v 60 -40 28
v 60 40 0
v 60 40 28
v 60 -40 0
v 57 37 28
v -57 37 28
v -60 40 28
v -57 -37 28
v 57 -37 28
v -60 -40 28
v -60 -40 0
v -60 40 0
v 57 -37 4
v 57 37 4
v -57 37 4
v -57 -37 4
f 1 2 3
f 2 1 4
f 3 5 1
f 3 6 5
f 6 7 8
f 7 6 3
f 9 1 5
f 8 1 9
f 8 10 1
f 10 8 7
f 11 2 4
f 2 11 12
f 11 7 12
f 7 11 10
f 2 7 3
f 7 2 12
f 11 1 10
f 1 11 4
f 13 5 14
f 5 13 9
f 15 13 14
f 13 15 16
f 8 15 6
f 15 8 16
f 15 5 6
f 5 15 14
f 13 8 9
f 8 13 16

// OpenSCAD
// Starter shell for task-001. Units: millimetres.
// Preserve x=[-60,60], y=[-40,40], z=[0,28], wall=3, floor=4.
$fn = 64;

outer_w = 120;
outer_d = 80;
outer_h = 28;
wall = 3;
floor = 4;

module tray_shell() {
    difference() {
        translate([-outer_w/2, -outer_d/2, 0])
            cube([outer_w, outer_d, outer_h]);
        translate([-outer_w/2 + wall, -outer_d/2 + wall, floor])
            cube([outer_w - 2*wall, outer_d - 2*wall, outer_h + 1]);
    }
}

tray_shell();
